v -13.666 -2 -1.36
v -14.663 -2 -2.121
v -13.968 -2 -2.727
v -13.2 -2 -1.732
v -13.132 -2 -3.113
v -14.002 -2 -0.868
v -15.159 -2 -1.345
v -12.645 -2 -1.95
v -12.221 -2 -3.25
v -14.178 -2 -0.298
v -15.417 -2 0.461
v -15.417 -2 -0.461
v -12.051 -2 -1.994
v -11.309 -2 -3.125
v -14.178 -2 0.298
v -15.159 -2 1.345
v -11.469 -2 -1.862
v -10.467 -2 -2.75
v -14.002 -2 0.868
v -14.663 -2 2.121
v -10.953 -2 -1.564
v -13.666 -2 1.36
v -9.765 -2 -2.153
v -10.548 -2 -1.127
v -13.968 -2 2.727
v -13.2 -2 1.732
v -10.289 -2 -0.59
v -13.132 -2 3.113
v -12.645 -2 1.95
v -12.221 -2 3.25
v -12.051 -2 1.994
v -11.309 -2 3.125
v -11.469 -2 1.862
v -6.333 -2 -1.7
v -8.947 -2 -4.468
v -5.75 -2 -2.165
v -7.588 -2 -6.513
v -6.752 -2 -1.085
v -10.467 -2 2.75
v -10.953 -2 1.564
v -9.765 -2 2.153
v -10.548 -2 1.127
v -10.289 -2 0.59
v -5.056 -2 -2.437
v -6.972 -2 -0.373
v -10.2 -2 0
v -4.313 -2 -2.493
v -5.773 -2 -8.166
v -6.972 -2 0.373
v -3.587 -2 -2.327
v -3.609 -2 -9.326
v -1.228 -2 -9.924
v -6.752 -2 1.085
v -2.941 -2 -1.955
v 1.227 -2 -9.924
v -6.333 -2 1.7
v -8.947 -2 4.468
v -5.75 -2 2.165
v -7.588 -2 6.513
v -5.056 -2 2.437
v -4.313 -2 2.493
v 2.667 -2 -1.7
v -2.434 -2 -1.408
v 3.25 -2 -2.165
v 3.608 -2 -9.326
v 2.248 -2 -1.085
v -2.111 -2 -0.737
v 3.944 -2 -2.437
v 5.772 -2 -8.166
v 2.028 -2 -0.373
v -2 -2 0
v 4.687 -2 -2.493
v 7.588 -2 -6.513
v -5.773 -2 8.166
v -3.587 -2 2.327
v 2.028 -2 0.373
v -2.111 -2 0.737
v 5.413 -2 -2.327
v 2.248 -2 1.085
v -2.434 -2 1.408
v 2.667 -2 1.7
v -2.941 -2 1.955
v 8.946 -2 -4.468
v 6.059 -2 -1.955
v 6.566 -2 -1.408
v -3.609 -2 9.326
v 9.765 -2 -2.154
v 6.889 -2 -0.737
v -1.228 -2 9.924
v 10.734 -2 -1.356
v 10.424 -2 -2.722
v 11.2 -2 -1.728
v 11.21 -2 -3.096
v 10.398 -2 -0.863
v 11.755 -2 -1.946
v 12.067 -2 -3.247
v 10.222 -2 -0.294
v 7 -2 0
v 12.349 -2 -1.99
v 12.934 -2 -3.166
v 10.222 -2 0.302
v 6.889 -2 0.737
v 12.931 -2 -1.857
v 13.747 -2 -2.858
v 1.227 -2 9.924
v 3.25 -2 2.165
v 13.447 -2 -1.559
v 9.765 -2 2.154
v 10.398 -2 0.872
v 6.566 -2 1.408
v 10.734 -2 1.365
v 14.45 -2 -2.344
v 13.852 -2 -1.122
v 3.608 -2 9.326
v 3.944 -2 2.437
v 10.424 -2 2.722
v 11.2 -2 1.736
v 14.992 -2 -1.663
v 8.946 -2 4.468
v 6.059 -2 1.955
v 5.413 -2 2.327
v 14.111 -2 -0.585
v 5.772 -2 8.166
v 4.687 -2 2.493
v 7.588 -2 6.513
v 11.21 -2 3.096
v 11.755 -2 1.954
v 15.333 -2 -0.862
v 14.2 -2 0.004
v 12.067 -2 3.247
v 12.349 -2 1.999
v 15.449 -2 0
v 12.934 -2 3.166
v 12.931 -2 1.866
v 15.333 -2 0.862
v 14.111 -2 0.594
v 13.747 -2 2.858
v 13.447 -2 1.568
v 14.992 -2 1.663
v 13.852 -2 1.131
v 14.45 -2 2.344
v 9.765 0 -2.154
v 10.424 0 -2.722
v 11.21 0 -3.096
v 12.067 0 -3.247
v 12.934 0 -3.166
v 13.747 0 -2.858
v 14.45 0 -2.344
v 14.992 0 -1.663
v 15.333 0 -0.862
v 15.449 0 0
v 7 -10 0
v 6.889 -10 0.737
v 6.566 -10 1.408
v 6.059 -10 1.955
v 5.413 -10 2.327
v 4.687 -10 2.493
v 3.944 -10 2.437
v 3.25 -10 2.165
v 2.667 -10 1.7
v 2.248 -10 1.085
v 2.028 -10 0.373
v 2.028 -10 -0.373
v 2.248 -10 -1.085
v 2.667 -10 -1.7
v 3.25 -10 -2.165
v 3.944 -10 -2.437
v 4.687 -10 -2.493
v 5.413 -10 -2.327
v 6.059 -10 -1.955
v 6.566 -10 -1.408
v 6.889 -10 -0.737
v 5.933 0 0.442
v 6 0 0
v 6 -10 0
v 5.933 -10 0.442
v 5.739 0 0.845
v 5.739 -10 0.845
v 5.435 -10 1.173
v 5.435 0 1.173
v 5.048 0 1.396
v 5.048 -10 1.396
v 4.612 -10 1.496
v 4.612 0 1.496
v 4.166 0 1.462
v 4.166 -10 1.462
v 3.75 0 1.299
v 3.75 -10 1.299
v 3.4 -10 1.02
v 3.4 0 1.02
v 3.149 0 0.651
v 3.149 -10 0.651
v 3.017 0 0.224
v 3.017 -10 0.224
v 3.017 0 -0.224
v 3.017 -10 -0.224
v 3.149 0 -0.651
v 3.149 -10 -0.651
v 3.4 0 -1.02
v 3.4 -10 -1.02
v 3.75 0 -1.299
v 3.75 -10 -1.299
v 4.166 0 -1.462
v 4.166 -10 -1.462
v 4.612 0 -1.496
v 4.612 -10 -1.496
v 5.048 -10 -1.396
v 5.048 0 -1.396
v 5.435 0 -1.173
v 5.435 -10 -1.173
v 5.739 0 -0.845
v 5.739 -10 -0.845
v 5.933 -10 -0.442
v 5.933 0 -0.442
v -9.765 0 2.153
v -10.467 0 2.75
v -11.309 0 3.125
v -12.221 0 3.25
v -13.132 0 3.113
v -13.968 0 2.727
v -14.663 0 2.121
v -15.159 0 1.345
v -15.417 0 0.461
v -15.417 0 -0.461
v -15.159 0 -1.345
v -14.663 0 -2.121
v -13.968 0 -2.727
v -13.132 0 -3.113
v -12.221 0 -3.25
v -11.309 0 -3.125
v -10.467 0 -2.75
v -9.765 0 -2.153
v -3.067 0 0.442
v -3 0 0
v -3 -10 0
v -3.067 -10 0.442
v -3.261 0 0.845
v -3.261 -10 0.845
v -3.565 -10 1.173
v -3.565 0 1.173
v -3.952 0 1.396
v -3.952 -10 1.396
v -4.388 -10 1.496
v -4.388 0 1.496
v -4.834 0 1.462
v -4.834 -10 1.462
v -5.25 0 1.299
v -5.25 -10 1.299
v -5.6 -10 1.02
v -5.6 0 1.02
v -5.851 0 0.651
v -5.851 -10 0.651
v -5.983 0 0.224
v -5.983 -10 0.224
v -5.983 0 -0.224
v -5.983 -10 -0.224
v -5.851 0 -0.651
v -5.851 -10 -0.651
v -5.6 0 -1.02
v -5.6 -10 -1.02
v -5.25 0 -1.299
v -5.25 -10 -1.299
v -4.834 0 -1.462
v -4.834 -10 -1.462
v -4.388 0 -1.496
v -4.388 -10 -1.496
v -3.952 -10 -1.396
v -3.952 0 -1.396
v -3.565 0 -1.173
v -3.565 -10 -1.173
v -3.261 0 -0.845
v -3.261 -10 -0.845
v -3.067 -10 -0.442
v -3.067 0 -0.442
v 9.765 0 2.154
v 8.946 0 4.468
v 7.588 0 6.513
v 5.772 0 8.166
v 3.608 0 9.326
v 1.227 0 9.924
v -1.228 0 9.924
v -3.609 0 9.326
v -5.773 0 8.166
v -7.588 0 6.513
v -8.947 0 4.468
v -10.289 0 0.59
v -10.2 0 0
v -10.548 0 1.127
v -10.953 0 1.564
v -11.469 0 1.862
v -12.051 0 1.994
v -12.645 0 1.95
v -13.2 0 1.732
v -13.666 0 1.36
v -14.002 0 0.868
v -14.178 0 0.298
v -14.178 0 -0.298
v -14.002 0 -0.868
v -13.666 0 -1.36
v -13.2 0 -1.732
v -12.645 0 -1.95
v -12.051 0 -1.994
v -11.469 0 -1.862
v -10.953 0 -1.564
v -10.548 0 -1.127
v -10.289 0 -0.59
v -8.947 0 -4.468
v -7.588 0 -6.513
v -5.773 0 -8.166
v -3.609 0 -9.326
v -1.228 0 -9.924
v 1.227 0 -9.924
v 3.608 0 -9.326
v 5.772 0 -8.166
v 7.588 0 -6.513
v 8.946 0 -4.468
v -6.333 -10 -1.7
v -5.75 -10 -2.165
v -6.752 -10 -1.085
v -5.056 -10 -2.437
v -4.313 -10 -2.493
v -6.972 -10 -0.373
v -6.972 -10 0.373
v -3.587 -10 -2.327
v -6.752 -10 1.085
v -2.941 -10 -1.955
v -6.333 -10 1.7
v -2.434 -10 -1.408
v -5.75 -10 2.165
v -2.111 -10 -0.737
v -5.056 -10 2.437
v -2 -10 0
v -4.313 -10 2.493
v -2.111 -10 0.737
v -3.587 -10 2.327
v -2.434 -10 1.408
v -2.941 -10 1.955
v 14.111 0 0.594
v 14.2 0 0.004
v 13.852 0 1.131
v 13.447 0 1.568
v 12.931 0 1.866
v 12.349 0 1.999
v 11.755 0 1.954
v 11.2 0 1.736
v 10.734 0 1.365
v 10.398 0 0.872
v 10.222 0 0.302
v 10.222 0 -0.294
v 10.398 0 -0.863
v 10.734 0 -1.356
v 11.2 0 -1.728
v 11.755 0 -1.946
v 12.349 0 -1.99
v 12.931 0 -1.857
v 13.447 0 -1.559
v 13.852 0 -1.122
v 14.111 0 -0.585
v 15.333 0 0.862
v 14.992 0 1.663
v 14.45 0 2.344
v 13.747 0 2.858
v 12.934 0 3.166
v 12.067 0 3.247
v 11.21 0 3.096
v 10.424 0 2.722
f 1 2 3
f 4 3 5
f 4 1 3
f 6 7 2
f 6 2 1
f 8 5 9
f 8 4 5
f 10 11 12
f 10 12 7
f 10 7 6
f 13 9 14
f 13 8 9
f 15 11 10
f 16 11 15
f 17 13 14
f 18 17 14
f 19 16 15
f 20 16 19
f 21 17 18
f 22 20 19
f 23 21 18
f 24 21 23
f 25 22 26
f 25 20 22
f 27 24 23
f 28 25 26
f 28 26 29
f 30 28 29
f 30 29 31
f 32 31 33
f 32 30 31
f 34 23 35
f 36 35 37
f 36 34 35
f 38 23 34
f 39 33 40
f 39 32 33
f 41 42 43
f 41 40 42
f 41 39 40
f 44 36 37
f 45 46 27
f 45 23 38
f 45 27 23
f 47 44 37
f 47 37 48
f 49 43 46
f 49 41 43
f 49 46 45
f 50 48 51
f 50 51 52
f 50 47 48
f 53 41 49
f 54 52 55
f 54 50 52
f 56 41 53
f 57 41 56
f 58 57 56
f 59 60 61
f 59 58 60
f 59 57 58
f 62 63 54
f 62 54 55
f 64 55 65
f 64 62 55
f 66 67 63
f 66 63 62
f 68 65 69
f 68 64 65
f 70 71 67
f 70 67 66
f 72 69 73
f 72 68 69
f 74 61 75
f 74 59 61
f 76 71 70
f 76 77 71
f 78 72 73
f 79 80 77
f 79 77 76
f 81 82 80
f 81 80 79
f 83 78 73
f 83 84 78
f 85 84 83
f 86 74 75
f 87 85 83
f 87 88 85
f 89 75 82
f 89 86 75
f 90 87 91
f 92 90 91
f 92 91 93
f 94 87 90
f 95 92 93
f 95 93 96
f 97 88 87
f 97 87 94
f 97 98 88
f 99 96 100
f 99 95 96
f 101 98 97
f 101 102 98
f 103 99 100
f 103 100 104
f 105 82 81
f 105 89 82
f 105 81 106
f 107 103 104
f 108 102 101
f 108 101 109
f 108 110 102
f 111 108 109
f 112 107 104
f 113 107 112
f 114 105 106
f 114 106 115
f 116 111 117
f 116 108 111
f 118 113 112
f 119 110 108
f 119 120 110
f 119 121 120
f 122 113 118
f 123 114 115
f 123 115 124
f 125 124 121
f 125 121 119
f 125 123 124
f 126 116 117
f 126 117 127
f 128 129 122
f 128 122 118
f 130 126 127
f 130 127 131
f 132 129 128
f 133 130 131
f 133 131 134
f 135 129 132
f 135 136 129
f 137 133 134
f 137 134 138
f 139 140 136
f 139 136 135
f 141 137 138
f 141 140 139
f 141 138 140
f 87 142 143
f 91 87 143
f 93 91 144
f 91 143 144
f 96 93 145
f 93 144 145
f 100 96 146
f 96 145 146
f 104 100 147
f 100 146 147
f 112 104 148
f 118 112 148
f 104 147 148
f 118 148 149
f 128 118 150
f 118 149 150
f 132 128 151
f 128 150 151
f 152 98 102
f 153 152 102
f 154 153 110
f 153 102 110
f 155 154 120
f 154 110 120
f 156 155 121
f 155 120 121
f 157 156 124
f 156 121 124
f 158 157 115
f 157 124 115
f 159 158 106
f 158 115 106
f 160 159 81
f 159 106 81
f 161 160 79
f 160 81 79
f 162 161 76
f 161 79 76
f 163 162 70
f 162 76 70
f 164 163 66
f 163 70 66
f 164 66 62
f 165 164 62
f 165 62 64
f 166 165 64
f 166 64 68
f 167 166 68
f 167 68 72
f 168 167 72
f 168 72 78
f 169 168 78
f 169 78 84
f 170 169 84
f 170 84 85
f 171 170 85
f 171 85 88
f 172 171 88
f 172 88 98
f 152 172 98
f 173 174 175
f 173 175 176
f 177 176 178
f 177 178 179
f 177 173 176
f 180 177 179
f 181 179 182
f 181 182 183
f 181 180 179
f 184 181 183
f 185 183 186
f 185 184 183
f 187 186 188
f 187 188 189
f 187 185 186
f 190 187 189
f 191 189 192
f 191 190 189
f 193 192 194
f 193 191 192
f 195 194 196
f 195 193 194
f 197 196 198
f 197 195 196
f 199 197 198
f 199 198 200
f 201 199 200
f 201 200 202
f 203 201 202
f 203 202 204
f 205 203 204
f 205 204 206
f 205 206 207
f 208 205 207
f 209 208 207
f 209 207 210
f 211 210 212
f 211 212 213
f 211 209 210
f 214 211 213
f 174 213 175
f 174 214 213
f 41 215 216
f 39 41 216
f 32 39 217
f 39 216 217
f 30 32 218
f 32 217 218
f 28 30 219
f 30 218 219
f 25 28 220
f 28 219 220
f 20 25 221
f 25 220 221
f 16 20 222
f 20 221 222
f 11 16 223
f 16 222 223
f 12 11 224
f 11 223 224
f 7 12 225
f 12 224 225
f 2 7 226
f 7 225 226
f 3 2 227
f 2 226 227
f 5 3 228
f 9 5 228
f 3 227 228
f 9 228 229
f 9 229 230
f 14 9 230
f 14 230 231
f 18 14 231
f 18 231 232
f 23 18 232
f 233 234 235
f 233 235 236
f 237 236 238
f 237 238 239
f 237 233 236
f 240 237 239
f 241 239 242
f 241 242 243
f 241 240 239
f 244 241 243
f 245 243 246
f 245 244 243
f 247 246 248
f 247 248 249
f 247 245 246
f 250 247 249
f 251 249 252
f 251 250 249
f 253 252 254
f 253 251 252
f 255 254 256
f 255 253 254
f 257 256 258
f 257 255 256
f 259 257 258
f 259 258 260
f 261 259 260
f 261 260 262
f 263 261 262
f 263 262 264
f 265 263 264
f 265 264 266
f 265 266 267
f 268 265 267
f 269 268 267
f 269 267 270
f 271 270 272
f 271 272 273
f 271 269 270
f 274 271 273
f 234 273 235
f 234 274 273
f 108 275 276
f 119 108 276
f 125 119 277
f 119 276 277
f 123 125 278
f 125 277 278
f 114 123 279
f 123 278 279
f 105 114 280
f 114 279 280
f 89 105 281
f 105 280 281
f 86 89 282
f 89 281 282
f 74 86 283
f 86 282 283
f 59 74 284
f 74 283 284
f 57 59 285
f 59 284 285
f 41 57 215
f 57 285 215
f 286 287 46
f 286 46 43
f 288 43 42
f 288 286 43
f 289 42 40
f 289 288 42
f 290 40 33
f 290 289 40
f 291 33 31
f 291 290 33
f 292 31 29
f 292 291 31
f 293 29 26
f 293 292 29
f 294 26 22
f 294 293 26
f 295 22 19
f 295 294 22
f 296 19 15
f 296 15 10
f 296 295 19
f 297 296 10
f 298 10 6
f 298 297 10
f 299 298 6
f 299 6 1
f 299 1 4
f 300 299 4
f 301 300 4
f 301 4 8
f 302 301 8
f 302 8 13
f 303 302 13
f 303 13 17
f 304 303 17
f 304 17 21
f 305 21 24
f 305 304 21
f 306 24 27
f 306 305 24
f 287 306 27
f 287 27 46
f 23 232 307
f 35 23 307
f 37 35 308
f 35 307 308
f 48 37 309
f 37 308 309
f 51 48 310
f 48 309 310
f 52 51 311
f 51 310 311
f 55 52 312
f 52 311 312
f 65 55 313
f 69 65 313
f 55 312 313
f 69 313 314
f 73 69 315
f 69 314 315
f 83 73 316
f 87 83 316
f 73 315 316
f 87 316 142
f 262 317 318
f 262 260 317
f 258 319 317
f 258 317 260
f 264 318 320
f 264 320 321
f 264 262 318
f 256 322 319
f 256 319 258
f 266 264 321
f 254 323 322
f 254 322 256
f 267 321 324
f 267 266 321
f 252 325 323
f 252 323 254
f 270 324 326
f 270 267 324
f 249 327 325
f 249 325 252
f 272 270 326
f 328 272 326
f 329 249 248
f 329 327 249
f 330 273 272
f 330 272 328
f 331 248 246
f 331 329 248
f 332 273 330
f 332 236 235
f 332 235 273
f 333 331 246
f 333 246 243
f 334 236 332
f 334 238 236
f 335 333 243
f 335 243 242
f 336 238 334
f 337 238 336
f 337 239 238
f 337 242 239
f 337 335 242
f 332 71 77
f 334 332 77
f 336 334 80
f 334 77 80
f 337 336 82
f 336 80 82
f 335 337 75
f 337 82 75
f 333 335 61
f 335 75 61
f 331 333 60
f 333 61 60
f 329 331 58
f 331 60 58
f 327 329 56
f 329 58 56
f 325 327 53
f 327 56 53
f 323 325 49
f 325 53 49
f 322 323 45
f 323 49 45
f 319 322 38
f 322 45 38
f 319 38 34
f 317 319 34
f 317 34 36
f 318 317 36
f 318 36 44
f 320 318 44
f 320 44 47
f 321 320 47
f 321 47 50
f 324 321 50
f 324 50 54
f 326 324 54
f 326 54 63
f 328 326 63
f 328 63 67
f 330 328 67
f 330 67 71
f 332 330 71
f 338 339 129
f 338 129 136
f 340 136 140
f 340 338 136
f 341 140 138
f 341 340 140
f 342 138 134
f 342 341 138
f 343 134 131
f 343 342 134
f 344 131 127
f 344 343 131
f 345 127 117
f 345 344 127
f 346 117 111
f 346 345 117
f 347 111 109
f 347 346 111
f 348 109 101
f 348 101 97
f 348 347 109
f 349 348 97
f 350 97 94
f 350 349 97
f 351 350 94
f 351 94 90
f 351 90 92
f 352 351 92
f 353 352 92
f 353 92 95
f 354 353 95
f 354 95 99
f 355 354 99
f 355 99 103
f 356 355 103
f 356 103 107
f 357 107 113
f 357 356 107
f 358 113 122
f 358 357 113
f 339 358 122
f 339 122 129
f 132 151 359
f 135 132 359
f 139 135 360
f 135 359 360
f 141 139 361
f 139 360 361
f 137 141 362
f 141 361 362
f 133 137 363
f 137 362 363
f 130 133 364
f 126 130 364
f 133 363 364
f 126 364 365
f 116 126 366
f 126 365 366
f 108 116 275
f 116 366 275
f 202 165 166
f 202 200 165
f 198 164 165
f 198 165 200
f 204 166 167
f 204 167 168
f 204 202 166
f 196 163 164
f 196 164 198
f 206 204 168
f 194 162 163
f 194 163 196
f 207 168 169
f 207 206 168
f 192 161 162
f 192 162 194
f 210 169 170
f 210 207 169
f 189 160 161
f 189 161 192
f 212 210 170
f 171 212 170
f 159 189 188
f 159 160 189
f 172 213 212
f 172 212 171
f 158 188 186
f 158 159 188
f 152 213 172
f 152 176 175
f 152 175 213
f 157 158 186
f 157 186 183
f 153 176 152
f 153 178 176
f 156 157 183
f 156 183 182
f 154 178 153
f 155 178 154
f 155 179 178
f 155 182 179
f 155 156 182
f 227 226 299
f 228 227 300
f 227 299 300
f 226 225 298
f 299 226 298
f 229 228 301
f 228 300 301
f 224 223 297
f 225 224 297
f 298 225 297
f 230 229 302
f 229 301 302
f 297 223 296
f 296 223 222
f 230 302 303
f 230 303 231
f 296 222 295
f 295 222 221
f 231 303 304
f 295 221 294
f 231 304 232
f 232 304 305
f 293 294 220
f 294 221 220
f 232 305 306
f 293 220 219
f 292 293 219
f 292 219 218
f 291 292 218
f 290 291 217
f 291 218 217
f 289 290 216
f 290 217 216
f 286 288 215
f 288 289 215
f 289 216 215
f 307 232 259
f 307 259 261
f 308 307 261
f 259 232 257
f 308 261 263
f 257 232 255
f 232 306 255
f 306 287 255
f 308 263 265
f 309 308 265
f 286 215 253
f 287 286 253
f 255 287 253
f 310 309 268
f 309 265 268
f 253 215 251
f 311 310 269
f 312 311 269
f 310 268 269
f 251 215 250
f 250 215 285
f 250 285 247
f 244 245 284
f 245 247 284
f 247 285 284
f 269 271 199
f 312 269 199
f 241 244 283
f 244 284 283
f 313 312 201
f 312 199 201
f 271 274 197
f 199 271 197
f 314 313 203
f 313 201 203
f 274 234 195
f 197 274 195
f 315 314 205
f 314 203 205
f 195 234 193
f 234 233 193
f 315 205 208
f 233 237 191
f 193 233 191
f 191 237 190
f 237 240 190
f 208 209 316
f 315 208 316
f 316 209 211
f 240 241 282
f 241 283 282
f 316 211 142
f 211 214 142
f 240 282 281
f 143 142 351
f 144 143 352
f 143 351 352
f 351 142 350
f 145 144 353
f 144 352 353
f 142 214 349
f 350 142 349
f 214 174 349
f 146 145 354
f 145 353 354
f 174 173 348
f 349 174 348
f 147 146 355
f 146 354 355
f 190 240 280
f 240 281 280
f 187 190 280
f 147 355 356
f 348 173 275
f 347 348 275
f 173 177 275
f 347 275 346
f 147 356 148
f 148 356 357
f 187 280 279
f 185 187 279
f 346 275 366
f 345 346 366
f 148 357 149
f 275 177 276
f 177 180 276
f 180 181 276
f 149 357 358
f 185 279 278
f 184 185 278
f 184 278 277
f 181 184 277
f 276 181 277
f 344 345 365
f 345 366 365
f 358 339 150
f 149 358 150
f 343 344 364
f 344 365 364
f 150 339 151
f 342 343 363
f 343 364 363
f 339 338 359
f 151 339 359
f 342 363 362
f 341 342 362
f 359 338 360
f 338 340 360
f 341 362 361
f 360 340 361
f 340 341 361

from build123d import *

# Parameters (mm, degrees)
F0_R     = 2.5
F1_DEPTH = 2
F0_R_2   = 1.5
F2_DEPTH = 10
F3_DEPTH = 2
F0_R_3   = 2
F4_DEPTH = 2
F5_DEPTH = 2


with BuildPart() as f1:
    # F0 (on Front) → F1 (new body)
    with BuildSketch(Plane.XZ):
        with BuildLine():
            ThreePointArc((9.7653447127, -2.1536115346), (8.9493655339, 0), (9.7653447127, 2.1536115346))
            ThreePointArc((9.7653447127, 2.1536115346), (-0.0002939612, 9.9999999957), (-9.7654713115, 2.1530374044))
            ThreePointArc((-9.7654713115, 2.1530374044), (-9.1606975934, 1.1511476366), (-8.95, 0))
            ThreePointArc((-8.95, 0), (-9.1606975934, -1.1511476366), (-9.7654713115, -2.1530374044))
            ThreePointArc((-9.7654713115, -2.1530374044), (-0.0002939612, -9.9999999957), (9.7653447127, -2.1536115346))
        make_face()
        with Locations((-4.5, 0)):
            Circle(F0_R, mode=Mode.SUBTRACT)
        with Locations((4.5, 0)):
            Circle(F0_R, mode=Mode.SUBTRACT)
    extrude(amount=F1_DEPTH)

    # F0 (on Front) → F2 (join)
    with BuildSketch(Plane.XZ):
        with Locations((-4.5, 0)):
            Circle(F0_R)
        with Locations((-4.5, 0)):
            Circle(F0_R_2, mode=Mode.SUBTRACT)
        with Locations((4.5, 0)):
            Circle(F0_R)
        with Locations((4.5, 0)):
            Circle(F0_R_2, mode=Mode.SUBTRACT)
    extrude(amount=F2_DEPTH)

    # F0 (on Front) → F3 (join)
    with BuildSketch(Plane.XZ):
        with BuildLine():
            ThreePointArc((9.7653447127, -2.1536115346), (8.9493655339, 0), (9.7653447127, 2.1536115346))
            ThreePointArc((9.7653447127, 2.1536115346), (-0.0002939612, 9.9999999957), (-9.7654713115, 2.1530374044))
            ThreePointArc((-9.7654713115, 2.1530374044), (-9.1606975934, 1.1511476366), (-8.95, 0))
            ThreePointArc((-8.95, 0), (-9.1606975934, -1.1511476366), (-9.7654713115, -2.1530374044))
            ThreePointArc((-9.7654713115, -2.1530374044), (-0.0002939612, -9.9999999957), (9.7653447127, -2.1536115346))
        make_face()
        with Locations((-4.5, 0)):
            Circle(F0_R, mode=Mode.SUBTRACT)
        with Locations((4.5, 0)):
            Circle(F0_R, mode=Mode.SUBTRACT)
    extrude(amount=F3_DEPTH)

    # F0 (on Front) → F4 (join)
    with BuildSketch(Plane.XZ):
        with BuildLine():
            ThreePointArc((9.7653447127, 2.1536115346), (9.9411630891, 1.0831788571), (10, 0))
            ThreePointArc((10, 0), (9.9411630891, -1.0831788571), (9.7653447127, -2.1536115346))
            ThreePointArc((9.7653447127, -2.1536115346), (13.3508715762, -3.0391666349), (15.4493655339, 0))
            ThreePointArc((15.4493655339, 0), (13.3508715762, 3.0391666349), (9.7653447127, 2.1536115346))
        make_face()
        with Locations((12.1999992313, 0.0043308363)):
            Circle(F0_R_3, mode=Mode.SUBTRACT)
        with BuildLine():
            ThreePointArc((-9.7654713115, -2.1530374044), (-10, 0), (-9.7654713115, 2.1530374044))
            ThreePointArc((-9.7654713115, 2.1530374044), (-15.45, 0), (-9.7654713115, -2.1530374044))
        make_face()
        with Locations((-12.2, 0)):
            Circle(F0_R_3, mode=Mode.SUBTRACT)
    extrude(amount=F4_DEPTH)

    # F0 (on Front) → F5 (join)
    with BuildSketch(Plane.XZ):
        with BuildLine():
            ThreePointArc((9.7653447127, -2.1536115346), (9.9411630891, -1.0831788571), (10, 0))
            ThreePointArc((10, 0), (9.9411630891, 1.0831788571), (9.7653447127, 2.1536115346))
            ThreePointArc((9.7653447127, 2.1536115346), (8.9493655339, 0), (9.7653447127, -2.1536115346))
        make_face()
        with BuildLine():
            ThreePointArc((-8.95, 0), (-9.1606975934, 1.1511476366), (-9.7654713115, 2.1530374044))
            ThreePointArc((-9.7654713115, 2.1530374044), (-10, 0), (-9.7654713115, -2.1530374044))
            ThreePointArc((-9.7654713115, -2.1530374044), (-9.1606975934, -1.1511476366), (-8.95, 0))
        make_face()
    extrude(amount=F5_DEPTH)


solid = f1.part
